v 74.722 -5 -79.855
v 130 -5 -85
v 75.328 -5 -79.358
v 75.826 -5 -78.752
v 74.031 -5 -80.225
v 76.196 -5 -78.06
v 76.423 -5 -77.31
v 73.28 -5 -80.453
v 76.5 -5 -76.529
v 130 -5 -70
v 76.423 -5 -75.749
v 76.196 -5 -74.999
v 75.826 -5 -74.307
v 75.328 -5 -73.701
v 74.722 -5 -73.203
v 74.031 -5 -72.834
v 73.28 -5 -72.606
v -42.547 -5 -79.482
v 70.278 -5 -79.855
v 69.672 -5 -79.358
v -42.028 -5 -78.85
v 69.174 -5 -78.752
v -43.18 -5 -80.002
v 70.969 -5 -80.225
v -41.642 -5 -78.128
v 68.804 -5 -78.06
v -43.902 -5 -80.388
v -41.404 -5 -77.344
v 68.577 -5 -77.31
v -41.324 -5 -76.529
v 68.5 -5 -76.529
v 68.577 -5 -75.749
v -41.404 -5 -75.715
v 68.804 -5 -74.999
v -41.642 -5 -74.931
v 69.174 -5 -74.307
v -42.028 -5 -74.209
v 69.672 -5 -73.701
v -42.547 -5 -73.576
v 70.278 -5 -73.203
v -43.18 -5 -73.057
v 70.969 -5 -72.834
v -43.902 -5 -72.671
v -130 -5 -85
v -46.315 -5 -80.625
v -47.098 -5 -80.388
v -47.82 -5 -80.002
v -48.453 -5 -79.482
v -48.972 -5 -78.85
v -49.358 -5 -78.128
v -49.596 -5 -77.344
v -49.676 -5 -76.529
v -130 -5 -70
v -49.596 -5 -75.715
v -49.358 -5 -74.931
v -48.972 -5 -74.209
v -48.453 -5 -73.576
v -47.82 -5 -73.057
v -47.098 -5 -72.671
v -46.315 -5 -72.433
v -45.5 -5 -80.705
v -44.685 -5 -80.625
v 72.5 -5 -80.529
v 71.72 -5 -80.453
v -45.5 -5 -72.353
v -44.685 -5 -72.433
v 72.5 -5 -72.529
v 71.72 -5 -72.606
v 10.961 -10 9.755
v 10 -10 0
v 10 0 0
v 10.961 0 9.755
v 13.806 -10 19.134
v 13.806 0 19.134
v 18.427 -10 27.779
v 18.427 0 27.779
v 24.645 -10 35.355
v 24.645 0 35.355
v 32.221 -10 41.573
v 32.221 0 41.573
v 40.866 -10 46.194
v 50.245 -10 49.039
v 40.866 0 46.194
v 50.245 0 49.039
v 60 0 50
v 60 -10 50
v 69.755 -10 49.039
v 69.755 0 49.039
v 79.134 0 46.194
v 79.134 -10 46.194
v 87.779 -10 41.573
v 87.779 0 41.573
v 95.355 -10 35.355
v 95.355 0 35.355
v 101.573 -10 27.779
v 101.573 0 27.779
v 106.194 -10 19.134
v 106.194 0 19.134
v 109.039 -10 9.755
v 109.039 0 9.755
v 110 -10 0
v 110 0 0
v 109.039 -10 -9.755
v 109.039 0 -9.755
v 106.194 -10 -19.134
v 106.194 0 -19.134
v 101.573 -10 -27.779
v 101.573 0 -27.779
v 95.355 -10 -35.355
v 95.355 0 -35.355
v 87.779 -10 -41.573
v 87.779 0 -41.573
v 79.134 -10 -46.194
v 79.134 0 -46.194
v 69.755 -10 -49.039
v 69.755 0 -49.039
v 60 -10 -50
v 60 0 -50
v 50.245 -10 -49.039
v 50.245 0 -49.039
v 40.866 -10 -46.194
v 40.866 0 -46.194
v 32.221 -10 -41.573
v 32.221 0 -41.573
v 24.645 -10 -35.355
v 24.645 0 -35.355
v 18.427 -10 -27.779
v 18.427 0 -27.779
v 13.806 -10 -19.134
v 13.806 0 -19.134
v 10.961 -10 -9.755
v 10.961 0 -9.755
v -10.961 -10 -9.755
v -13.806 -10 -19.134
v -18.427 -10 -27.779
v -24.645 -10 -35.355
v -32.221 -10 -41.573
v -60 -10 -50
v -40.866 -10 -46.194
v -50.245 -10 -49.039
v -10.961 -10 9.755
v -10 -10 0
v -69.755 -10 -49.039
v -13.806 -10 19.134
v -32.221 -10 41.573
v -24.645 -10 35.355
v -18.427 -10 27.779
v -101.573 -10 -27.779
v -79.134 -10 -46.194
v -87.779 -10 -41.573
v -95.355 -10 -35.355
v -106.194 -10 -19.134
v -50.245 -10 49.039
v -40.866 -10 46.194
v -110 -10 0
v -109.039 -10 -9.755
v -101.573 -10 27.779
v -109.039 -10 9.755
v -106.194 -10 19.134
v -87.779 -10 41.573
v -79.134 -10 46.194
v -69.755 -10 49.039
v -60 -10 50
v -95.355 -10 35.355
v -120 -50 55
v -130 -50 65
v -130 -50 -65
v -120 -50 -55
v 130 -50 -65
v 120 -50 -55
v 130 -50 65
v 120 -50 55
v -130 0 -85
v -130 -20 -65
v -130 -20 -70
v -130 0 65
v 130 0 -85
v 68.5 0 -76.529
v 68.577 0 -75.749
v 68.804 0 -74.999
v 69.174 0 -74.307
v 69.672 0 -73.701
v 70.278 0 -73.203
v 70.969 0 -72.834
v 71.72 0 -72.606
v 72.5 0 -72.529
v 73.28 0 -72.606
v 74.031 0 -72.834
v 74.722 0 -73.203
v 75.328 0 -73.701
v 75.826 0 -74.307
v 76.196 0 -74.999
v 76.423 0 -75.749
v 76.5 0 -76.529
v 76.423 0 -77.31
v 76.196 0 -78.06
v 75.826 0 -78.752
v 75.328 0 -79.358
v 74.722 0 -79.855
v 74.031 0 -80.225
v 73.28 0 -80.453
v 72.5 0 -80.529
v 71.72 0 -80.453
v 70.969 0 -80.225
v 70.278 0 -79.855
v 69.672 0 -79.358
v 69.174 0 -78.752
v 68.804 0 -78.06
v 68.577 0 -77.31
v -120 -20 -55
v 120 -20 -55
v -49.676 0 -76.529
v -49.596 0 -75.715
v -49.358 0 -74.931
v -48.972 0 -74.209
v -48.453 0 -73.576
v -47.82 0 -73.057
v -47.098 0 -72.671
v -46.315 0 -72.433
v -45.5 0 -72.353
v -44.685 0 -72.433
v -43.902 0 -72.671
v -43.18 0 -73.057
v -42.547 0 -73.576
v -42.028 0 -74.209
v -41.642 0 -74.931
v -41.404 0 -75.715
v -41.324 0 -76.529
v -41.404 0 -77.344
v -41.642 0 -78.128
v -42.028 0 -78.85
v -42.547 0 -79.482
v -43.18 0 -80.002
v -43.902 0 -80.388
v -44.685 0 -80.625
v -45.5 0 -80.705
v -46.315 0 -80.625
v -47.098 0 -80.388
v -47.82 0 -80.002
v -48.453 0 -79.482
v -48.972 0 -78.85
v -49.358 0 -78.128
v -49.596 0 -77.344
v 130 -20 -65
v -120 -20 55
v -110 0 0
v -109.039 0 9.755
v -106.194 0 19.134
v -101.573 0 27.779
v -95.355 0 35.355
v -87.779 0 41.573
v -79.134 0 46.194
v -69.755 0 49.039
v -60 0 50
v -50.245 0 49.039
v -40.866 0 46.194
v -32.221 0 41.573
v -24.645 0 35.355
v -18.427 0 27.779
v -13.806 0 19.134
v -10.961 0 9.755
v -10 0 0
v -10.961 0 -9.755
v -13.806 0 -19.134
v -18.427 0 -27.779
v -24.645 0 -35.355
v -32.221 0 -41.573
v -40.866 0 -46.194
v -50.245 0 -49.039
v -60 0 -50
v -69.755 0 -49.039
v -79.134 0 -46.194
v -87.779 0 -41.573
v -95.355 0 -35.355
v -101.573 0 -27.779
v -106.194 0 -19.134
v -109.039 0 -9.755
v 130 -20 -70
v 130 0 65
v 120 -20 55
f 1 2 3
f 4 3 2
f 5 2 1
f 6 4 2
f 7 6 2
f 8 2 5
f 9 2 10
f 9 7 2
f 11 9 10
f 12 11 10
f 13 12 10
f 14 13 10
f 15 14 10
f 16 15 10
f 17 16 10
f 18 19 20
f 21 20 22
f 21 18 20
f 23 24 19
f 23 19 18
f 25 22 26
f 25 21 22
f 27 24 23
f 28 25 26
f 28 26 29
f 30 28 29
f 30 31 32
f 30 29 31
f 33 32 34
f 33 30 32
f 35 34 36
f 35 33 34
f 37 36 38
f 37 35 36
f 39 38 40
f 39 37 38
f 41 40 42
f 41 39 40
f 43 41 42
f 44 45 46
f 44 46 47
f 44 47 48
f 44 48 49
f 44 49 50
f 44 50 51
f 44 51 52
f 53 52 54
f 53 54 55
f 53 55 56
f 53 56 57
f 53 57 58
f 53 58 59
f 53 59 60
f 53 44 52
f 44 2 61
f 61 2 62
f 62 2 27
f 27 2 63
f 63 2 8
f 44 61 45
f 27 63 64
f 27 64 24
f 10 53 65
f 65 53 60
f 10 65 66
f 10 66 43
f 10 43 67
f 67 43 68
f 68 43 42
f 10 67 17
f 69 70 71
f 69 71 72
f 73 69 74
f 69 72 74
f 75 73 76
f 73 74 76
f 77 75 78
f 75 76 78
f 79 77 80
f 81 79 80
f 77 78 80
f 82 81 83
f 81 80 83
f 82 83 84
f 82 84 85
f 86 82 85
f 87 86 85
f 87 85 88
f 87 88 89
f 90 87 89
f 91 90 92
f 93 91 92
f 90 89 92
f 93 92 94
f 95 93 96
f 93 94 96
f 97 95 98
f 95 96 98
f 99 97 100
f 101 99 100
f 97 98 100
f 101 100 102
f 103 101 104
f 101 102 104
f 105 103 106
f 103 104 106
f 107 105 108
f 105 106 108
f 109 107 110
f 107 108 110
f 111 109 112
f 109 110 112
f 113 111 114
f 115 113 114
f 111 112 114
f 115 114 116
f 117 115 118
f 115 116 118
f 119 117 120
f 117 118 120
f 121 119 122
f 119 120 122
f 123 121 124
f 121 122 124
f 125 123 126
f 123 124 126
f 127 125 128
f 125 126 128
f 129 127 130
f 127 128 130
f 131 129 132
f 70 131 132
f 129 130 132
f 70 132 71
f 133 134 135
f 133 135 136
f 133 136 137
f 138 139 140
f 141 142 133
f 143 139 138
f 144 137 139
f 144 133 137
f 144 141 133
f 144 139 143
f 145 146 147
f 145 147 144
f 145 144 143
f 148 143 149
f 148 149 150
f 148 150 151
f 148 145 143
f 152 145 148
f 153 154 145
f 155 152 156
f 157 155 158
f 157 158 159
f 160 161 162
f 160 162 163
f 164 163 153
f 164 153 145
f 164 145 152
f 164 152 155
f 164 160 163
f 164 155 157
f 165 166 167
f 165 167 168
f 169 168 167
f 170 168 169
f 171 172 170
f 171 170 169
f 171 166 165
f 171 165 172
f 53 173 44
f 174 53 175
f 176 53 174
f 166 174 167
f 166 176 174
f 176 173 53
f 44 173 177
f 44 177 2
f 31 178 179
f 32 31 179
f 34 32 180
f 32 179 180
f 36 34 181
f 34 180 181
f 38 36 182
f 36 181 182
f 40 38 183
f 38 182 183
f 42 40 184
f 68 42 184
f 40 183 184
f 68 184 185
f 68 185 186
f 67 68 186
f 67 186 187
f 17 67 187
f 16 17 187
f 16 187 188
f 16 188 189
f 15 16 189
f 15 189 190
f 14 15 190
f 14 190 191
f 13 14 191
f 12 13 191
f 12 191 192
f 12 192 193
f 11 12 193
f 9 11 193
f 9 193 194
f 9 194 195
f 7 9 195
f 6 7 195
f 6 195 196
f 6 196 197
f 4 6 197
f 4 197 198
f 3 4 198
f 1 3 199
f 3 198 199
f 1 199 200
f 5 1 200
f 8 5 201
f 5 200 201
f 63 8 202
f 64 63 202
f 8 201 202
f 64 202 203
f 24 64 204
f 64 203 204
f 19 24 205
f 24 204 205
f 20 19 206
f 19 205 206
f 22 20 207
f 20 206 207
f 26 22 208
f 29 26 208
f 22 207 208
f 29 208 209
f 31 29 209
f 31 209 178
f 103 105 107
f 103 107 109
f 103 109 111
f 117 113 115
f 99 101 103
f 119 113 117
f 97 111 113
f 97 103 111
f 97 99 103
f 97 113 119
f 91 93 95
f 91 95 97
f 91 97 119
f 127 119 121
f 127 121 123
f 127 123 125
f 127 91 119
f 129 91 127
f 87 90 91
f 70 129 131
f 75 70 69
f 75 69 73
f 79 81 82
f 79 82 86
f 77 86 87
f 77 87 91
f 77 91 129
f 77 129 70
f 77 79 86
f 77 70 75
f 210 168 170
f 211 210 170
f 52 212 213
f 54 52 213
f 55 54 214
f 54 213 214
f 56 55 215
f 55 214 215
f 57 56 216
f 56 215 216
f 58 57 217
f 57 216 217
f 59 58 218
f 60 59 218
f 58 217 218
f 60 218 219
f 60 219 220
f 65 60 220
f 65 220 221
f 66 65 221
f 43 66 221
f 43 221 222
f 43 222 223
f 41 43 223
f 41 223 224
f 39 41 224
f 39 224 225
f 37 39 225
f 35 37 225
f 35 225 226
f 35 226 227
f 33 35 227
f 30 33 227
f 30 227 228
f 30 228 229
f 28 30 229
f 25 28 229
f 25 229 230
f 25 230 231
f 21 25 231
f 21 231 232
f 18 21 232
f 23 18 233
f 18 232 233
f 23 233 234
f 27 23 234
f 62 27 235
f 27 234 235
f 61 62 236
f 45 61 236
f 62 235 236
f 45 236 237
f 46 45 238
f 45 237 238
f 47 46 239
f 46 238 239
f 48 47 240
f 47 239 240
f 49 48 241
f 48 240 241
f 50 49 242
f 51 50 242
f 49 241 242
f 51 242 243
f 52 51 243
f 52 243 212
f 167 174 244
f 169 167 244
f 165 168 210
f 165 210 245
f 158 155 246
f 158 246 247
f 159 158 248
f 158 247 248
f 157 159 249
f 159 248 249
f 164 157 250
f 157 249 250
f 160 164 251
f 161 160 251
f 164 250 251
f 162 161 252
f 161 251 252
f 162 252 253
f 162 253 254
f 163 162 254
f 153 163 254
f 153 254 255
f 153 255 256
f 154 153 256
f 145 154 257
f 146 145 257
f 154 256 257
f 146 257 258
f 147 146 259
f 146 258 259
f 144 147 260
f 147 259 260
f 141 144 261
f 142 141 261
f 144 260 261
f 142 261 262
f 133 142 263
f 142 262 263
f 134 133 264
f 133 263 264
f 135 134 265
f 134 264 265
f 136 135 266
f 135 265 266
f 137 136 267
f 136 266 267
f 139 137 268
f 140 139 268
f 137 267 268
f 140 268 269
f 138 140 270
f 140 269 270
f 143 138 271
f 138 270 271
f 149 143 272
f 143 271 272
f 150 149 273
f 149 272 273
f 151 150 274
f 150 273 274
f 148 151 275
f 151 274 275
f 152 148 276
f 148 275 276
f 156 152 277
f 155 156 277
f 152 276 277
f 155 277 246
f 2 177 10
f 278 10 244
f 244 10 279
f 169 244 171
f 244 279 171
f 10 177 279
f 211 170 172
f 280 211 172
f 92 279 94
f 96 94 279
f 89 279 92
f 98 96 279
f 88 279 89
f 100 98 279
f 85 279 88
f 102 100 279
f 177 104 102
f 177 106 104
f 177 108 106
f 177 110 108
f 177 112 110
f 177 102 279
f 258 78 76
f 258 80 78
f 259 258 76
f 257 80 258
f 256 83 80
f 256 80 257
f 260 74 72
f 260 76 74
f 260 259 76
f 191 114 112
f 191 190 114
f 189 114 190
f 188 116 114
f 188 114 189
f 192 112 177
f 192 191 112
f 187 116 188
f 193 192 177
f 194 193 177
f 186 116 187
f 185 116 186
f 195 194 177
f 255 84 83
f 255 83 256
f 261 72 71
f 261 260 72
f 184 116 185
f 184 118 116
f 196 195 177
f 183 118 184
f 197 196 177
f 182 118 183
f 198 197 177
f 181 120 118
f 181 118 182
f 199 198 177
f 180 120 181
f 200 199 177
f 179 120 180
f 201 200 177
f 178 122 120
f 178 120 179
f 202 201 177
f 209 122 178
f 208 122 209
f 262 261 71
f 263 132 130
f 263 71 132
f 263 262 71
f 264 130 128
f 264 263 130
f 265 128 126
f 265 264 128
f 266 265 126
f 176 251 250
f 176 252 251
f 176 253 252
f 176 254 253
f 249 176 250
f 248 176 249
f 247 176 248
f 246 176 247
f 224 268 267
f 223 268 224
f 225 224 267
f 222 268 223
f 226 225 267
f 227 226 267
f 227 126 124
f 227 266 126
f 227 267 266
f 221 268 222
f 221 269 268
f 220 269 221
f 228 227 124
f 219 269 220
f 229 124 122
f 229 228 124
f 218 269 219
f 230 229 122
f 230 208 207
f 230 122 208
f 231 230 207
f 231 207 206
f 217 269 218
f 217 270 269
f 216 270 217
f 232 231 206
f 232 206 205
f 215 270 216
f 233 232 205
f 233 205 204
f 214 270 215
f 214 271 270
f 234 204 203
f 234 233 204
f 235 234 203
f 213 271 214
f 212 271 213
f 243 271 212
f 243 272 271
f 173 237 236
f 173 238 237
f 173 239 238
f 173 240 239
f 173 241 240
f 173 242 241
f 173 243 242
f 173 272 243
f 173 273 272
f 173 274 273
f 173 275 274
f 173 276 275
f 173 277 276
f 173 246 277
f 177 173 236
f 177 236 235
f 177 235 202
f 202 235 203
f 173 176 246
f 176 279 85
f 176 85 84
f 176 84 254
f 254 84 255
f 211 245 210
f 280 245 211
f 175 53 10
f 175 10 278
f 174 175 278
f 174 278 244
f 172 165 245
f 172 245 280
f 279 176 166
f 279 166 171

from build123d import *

# Parameters (mm, degrees)
F0_W     = 260
F0_H     = 130
F1_DEPTH = 50
F2_R     = 50
F3_DEPTH = 10
F4_W     = 240
F4_H     = 110
F5_DEPTH = 30
F7_DEPTH = 260
F8_R     = 4
F8_R_2   = 4.17612
F9_DEPTH = 25


with BuildPart() as f1:
    # F0 (on Front) → F1 (new body)
    with BuildSketch(Plane.XZ):
        Rectangle(F0_W, F0_H)
    extrude(amount=F1_DEPTH)

    # F2 (on face) → F3 (cut)
    with BuildSketch(Plane(origin=(0, 0, 0), x_dir=(-1, 0, 0), z_dir=(0, 1, 0))):
        with Locations((60, 0)):
            Circle(F2_R)
        with Locations((-60, 0)):
            Circle(F2_R)
    extrude(amount=-F3_DEPTH, mode=Mode.SUBTRACT)

    # F4 (on face) → F5 (cut)
    with BuildSketch(Plane.XZ.offset(50)):
        Rectangle(F4_W, F4_H)
    extrude(amount=-F5_DEPTH, mode=Mode.SUBTRACT)

    # F6 (on face) → F7 (join)
    with BuildSketch(Plane(origin=(-130, 0, 0), x_dir=(0, -1, 0), z_dir=(-1, 0, 0))):
        Polygon((20, -65), (0, -65), (0, -85), (5, -85), (5, -70), (20, -70), align=None)
    extrude(amount=-F7_DEPTH)

    # F8 (on face) → F9 (cut)
    with BuildSketch(Plane(origin=(0, 0, 0), x_dir=(-1, 0, 0), z_dir=(0, 1, 0))):
        with Locations((-72.5, -76.529376)):
            Circle(F8_R)
        with Locations((45.50003, -76.529376)):
            Circle(F8_R_2)
    extrude(amount=-F9_DEPTH, mode=Mode.SUBTRACT)


solid = f1.part
